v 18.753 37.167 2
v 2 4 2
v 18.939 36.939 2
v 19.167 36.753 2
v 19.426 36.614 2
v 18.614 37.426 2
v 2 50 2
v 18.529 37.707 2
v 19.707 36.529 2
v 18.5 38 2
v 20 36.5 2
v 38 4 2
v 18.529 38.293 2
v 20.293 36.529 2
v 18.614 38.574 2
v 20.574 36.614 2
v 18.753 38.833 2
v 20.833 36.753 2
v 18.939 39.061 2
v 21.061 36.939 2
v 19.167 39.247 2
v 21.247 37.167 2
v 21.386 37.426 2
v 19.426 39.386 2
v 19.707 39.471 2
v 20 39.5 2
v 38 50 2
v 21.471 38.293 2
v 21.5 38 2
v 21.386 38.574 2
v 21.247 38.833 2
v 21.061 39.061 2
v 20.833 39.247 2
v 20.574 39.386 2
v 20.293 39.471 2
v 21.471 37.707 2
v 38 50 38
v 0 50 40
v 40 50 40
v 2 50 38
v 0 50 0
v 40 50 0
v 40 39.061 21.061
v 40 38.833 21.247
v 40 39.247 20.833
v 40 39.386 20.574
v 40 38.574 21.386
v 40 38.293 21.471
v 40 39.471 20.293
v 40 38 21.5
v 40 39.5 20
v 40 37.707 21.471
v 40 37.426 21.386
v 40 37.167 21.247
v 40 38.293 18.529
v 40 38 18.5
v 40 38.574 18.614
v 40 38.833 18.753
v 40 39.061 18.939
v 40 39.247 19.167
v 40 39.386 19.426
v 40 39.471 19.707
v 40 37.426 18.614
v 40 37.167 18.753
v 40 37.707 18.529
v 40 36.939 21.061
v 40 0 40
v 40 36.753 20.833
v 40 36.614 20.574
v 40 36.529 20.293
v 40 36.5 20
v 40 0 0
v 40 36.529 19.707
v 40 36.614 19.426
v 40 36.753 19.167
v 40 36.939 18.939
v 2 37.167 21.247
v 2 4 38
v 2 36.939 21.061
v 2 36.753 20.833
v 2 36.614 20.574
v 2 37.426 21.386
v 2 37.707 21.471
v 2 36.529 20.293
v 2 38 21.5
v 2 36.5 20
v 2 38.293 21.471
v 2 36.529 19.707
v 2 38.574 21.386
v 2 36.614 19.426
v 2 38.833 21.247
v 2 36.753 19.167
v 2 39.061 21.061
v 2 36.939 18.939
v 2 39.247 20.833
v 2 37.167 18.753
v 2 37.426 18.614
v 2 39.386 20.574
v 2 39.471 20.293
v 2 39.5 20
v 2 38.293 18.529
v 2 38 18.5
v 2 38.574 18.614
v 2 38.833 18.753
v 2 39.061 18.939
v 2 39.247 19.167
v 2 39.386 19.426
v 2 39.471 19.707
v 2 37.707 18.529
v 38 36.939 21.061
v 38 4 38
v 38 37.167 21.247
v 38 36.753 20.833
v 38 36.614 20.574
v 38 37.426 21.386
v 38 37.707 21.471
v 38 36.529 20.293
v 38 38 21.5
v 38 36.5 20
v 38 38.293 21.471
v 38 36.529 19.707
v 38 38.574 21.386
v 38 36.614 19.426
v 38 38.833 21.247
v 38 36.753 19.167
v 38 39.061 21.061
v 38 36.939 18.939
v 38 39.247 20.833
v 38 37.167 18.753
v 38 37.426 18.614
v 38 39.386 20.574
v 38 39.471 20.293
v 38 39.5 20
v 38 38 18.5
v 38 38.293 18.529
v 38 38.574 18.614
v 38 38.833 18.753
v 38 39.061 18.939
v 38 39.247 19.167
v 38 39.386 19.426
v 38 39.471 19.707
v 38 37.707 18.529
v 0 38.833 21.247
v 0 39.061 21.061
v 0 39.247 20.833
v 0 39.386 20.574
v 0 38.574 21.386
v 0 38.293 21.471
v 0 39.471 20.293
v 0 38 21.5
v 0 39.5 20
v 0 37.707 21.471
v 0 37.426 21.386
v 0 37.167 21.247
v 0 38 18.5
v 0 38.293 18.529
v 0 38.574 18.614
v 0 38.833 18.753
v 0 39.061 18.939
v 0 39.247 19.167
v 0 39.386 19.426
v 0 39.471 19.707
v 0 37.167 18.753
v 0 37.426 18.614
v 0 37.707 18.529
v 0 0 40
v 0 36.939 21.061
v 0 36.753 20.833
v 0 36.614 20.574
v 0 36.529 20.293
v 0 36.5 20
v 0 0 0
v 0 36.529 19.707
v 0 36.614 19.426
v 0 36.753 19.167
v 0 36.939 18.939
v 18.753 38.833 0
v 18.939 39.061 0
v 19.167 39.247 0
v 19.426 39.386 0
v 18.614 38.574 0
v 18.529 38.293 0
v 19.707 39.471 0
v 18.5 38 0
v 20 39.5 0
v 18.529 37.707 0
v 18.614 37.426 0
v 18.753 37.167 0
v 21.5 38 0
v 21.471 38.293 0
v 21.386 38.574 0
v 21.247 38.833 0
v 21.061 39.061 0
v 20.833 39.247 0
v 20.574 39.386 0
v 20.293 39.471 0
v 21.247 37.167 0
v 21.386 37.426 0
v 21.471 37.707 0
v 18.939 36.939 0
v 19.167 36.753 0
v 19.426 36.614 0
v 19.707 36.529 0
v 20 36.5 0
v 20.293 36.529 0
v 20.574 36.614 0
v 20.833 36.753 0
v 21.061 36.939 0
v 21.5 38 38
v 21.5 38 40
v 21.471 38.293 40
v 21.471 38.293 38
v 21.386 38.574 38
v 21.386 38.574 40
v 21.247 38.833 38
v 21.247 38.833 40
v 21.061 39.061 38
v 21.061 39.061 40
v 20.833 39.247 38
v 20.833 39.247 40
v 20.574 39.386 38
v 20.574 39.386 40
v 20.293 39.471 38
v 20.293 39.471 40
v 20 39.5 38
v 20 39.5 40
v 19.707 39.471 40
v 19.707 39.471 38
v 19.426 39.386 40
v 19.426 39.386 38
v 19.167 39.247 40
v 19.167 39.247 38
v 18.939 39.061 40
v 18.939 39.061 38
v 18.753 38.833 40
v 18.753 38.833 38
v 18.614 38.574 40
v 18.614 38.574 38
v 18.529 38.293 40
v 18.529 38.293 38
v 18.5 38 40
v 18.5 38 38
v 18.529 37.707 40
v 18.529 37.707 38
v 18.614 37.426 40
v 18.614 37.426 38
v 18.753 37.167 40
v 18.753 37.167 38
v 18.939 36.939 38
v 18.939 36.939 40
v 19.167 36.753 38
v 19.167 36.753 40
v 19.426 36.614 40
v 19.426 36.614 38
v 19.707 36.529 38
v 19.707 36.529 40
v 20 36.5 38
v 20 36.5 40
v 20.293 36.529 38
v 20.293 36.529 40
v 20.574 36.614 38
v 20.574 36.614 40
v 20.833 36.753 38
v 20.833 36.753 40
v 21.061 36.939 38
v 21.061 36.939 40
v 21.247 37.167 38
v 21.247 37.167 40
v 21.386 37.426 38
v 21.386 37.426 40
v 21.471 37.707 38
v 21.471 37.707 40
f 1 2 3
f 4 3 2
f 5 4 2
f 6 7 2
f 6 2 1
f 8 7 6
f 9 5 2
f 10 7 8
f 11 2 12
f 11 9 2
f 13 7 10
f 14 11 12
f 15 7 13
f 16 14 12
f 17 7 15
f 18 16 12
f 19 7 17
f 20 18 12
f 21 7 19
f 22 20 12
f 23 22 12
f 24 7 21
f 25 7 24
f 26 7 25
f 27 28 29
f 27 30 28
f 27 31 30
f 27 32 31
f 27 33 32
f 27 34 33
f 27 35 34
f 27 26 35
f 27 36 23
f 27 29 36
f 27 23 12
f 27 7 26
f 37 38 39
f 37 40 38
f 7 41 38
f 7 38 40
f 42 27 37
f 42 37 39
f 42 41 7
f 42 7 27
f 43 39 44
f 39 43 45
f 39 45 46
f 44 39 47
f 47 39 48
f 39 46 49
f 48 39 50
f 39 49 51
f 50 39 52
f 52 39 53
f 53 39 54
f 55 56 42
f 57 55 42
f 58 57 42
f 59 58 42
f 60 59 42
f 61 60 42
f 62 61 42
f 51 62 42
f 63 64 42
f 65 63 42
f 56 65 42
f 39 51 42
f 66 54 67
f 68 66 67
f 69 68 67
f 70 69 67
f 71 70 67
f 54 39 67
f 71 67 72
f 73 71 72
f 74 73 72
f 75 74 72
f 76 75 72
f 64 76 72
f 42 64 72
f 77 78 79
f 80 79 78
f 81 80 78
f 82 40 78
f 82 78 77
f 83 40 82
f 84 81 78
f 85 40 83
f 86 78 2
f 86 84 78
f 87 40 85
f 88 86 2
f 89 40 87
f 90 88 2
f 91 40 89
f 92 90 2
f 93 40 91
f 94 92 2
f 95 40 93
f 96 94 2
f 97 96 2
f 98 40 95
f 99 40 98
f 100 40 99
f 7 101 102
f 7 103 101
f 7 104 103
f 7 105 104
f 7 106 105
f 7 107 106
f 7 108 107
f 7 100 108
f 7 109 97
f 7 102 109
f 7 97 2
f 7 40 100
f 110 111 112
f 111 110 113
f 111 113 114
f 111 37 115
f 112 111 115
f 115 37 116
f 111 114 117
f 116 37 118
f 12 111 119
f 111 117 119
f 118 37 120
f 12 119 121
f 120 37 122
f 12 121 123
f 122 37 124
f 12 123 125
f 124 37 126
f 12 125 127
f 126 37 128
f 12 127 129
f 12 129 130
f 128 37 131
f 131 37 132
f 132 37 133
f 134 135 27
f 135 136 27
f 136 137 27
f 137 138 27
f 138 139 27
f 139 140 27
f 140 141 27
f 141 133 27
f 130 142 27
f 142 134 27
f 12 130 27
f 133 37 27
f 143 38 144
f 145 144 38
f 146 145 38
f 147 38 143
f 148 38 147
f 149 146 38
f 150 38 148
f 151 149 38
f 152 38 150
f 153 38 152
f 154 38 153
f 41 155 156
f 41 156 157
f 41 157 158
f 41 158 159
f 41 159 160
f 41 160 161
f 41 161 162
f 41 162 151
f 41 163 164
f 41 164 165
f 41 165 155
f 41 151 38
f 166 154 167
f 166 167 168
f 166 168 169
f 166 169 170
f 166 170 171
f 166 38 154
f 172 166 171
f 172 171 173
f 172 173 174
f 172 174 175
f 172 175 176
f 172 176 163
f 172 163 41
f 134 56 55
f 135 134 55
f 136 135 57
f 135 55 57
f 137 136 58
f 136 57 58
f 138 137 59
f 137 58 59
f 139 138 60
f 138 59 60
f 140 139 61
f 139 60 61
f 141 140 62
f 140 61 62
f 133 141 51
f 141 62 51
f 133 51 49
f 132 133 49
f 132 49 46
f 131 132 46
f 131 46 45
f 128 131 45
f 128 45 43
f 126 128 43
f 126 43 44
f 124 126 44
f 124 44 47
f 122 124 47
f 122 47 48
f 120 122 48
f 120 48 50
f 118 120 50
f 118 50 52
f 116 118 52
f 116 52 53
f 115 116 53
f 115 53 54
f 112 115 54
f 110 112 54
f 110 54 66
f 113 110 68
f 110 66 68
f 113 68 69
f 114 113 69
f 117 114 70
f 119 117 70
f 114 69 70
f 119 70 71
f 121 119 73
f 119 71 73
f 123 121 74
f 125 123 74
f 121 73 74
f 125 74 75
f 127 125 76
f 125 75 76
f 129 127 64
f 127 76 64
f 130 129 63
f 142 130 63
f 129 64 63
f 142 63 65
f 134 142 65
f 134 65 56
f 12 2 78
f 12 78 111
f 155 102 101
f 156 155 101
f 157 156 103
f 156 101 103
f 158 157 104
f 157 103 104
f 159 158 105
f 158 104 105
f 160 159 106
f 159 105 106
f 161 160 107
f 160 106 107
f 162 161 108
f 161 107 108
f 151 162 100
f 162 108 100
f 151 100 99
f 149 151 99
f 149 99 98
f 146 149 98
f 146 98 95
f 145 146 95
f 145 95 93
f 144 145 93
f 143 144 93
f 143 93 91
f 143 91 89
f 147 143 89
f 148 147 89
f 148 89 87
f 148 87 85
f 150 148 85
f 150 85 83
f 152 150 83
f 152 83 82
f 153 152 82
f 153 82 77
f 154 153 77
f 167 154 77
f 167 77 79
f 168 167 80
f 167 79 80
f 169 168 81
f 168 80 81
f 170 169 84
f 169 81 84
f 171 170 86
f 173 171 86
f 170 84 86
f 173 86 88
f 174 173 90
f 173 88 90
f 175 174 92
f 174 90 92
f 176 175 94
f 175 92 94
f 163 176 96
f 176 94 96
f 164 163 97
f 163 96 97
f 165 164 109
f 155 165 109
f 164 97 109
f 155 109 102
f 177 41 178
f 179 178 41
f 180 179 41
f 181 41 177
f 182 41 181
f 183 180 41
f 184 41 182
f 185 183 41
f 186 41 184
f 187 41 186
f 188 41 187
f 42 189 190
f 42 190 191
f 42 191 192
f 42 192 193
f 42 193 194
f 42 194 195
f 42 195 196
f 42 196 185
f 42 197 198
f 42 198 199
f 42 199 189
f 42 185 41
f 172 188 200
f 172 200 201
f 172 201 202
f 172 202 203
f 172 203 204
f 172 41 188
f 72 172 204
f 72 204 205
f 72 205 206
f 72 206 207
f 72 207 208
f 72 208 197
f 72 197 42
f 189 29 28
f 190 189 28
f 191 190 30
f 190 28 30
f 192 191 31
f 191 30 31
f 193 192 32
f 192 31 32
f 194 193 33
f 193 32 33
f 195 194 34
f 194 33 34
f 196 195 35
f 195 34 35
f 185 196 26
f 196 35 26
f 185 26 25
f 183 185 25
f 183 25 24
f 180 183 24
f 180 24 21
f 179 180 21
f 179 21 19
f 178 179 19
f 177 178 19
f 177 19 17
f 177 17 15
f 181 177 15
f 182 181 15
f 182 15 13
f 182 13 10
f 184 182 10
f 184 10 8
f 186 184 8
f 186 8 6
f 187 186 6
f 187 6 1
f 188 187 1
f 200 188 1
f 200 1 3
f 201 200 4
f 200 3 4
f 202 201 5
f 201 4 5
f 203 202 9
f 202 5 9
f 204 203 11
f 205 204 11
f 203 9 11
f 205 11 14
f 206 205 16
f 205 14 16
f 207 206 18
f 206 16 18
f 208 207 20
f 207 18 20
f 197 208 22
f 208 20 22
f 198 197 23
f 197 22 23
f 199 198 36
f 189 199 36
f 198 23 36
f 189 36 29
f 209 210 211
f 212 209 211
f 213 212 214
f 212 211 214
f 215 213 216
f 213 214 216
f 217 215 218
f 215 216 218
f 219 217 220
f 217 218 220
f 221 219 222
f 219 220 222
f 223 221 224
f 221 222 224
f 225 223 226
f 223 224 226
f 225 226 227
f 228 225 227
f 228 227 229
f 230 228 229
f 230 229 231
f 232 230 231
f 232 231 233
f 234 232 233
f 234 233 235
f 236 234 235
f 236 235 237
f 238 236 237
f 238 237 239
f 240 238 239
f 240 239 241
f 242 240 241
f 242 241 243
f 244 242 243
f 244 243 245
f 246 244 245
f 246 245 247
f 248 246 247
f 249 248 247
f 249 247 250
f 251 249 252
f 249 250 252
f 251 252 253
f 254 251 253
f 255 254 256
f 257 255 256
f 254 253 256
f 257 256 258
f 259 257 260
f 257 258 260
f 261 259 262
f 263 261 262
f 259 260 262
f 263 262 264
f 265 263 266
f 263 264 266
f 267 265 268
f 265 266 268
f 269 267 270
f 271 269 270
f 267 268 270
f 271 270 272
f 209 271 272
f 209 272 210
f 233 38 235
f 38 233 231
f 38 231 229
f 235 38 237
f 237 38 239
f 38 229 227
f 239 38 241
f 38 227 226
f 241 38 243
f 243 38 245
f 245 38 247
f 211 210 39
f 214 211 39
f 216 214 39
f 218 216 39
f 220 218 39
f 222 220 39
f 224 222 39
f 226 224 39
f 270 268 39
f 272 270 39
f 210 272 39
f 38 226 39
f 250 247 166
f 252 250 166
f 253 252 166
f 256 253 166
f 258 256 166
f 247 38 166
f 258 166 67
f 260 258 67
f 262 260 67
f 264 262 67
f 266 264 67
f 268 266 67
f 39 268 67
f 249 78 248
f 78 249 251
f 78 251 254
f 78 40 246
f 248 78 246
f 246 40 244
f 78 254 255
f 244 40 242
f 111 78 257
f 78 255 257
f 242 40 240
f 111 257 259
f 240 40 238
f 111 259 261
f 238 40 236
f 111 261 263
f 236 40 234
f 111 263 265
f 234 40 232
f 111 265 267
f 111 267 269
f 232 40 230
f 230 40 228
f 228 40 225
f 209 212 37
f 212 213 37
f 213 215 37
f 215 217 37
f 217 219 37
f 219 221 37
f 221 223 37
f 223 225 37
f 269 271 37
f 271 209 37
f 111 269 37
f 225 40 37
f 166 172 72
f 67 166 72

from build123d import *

# Parameters (mm, degrees)
SKETCH_1_W          = 40
SKETCH_1_H          = 40
EXTRUDE_1_DEPTH     = 50
SKETCH_2_W          = 36
SKETCH_2_H          = 36
CUT_EXTRUDE_1_DEPTH = 46
SKETCH_3_R          = 1.5
CUT_EXTRUDE_2_DEPTH = 46
SKETCH_4_R          = 1.5
CUT_EXTRUDE_3_DEPTH = 46


with BuildPart() as part:
    # 草图1 → 凸台-拉伸1 (new body)
    with BuildSketch(Plane(origin=(0, 0, 0), x_dir=(1, 0, 0), z_dir=(0, 1, 0))):
        with Locations((20, -20)):
            Rectangle(SKETCH_1_W, SKETCH_1_H)
    extrude(amount=EXTRUDE_1_DEPTH)

    # 草图2 → 切除-拉伸1 (cut)
    with BuildSketch(Plane(origin=(0, 50, 0), x_dir=(1, 0, 0), z_dir=(0, 1, 0))):
        with Locations((20, -20)):
            Rectangle(SKETCH_2_W, SKETCH_2_H)
    extrude(amount=-CUT_EXTRUDE_1_DEPTH, mode=Mode.SUBTRACT)

    # 草图3 → 切除-拉伸2 (cut)
    with BuildSketch(Plane.XY.offset(40)):
        with Locations((20, 38)):
            Circle(SKETCH_3_R)
    extrude(amount=-CUT_EXTRUDE_2_DEPTH, mode=Mode.SUBTRACT)

    # 草图4 → 切除-拉伸3 (cut)
    with BuildSketch(Plane(origin=(40, 0, 0), x_dir=(0, 0, -1), z_dir=(1, 0, 0))):
        with Locations((-20, 38)):
            Circle(SKETCH_4_R)
    extrude(amount=-CUT_EXTRUDE_3_DEPTH, mode=Mode.SUBTRACT)


solid = part.part
